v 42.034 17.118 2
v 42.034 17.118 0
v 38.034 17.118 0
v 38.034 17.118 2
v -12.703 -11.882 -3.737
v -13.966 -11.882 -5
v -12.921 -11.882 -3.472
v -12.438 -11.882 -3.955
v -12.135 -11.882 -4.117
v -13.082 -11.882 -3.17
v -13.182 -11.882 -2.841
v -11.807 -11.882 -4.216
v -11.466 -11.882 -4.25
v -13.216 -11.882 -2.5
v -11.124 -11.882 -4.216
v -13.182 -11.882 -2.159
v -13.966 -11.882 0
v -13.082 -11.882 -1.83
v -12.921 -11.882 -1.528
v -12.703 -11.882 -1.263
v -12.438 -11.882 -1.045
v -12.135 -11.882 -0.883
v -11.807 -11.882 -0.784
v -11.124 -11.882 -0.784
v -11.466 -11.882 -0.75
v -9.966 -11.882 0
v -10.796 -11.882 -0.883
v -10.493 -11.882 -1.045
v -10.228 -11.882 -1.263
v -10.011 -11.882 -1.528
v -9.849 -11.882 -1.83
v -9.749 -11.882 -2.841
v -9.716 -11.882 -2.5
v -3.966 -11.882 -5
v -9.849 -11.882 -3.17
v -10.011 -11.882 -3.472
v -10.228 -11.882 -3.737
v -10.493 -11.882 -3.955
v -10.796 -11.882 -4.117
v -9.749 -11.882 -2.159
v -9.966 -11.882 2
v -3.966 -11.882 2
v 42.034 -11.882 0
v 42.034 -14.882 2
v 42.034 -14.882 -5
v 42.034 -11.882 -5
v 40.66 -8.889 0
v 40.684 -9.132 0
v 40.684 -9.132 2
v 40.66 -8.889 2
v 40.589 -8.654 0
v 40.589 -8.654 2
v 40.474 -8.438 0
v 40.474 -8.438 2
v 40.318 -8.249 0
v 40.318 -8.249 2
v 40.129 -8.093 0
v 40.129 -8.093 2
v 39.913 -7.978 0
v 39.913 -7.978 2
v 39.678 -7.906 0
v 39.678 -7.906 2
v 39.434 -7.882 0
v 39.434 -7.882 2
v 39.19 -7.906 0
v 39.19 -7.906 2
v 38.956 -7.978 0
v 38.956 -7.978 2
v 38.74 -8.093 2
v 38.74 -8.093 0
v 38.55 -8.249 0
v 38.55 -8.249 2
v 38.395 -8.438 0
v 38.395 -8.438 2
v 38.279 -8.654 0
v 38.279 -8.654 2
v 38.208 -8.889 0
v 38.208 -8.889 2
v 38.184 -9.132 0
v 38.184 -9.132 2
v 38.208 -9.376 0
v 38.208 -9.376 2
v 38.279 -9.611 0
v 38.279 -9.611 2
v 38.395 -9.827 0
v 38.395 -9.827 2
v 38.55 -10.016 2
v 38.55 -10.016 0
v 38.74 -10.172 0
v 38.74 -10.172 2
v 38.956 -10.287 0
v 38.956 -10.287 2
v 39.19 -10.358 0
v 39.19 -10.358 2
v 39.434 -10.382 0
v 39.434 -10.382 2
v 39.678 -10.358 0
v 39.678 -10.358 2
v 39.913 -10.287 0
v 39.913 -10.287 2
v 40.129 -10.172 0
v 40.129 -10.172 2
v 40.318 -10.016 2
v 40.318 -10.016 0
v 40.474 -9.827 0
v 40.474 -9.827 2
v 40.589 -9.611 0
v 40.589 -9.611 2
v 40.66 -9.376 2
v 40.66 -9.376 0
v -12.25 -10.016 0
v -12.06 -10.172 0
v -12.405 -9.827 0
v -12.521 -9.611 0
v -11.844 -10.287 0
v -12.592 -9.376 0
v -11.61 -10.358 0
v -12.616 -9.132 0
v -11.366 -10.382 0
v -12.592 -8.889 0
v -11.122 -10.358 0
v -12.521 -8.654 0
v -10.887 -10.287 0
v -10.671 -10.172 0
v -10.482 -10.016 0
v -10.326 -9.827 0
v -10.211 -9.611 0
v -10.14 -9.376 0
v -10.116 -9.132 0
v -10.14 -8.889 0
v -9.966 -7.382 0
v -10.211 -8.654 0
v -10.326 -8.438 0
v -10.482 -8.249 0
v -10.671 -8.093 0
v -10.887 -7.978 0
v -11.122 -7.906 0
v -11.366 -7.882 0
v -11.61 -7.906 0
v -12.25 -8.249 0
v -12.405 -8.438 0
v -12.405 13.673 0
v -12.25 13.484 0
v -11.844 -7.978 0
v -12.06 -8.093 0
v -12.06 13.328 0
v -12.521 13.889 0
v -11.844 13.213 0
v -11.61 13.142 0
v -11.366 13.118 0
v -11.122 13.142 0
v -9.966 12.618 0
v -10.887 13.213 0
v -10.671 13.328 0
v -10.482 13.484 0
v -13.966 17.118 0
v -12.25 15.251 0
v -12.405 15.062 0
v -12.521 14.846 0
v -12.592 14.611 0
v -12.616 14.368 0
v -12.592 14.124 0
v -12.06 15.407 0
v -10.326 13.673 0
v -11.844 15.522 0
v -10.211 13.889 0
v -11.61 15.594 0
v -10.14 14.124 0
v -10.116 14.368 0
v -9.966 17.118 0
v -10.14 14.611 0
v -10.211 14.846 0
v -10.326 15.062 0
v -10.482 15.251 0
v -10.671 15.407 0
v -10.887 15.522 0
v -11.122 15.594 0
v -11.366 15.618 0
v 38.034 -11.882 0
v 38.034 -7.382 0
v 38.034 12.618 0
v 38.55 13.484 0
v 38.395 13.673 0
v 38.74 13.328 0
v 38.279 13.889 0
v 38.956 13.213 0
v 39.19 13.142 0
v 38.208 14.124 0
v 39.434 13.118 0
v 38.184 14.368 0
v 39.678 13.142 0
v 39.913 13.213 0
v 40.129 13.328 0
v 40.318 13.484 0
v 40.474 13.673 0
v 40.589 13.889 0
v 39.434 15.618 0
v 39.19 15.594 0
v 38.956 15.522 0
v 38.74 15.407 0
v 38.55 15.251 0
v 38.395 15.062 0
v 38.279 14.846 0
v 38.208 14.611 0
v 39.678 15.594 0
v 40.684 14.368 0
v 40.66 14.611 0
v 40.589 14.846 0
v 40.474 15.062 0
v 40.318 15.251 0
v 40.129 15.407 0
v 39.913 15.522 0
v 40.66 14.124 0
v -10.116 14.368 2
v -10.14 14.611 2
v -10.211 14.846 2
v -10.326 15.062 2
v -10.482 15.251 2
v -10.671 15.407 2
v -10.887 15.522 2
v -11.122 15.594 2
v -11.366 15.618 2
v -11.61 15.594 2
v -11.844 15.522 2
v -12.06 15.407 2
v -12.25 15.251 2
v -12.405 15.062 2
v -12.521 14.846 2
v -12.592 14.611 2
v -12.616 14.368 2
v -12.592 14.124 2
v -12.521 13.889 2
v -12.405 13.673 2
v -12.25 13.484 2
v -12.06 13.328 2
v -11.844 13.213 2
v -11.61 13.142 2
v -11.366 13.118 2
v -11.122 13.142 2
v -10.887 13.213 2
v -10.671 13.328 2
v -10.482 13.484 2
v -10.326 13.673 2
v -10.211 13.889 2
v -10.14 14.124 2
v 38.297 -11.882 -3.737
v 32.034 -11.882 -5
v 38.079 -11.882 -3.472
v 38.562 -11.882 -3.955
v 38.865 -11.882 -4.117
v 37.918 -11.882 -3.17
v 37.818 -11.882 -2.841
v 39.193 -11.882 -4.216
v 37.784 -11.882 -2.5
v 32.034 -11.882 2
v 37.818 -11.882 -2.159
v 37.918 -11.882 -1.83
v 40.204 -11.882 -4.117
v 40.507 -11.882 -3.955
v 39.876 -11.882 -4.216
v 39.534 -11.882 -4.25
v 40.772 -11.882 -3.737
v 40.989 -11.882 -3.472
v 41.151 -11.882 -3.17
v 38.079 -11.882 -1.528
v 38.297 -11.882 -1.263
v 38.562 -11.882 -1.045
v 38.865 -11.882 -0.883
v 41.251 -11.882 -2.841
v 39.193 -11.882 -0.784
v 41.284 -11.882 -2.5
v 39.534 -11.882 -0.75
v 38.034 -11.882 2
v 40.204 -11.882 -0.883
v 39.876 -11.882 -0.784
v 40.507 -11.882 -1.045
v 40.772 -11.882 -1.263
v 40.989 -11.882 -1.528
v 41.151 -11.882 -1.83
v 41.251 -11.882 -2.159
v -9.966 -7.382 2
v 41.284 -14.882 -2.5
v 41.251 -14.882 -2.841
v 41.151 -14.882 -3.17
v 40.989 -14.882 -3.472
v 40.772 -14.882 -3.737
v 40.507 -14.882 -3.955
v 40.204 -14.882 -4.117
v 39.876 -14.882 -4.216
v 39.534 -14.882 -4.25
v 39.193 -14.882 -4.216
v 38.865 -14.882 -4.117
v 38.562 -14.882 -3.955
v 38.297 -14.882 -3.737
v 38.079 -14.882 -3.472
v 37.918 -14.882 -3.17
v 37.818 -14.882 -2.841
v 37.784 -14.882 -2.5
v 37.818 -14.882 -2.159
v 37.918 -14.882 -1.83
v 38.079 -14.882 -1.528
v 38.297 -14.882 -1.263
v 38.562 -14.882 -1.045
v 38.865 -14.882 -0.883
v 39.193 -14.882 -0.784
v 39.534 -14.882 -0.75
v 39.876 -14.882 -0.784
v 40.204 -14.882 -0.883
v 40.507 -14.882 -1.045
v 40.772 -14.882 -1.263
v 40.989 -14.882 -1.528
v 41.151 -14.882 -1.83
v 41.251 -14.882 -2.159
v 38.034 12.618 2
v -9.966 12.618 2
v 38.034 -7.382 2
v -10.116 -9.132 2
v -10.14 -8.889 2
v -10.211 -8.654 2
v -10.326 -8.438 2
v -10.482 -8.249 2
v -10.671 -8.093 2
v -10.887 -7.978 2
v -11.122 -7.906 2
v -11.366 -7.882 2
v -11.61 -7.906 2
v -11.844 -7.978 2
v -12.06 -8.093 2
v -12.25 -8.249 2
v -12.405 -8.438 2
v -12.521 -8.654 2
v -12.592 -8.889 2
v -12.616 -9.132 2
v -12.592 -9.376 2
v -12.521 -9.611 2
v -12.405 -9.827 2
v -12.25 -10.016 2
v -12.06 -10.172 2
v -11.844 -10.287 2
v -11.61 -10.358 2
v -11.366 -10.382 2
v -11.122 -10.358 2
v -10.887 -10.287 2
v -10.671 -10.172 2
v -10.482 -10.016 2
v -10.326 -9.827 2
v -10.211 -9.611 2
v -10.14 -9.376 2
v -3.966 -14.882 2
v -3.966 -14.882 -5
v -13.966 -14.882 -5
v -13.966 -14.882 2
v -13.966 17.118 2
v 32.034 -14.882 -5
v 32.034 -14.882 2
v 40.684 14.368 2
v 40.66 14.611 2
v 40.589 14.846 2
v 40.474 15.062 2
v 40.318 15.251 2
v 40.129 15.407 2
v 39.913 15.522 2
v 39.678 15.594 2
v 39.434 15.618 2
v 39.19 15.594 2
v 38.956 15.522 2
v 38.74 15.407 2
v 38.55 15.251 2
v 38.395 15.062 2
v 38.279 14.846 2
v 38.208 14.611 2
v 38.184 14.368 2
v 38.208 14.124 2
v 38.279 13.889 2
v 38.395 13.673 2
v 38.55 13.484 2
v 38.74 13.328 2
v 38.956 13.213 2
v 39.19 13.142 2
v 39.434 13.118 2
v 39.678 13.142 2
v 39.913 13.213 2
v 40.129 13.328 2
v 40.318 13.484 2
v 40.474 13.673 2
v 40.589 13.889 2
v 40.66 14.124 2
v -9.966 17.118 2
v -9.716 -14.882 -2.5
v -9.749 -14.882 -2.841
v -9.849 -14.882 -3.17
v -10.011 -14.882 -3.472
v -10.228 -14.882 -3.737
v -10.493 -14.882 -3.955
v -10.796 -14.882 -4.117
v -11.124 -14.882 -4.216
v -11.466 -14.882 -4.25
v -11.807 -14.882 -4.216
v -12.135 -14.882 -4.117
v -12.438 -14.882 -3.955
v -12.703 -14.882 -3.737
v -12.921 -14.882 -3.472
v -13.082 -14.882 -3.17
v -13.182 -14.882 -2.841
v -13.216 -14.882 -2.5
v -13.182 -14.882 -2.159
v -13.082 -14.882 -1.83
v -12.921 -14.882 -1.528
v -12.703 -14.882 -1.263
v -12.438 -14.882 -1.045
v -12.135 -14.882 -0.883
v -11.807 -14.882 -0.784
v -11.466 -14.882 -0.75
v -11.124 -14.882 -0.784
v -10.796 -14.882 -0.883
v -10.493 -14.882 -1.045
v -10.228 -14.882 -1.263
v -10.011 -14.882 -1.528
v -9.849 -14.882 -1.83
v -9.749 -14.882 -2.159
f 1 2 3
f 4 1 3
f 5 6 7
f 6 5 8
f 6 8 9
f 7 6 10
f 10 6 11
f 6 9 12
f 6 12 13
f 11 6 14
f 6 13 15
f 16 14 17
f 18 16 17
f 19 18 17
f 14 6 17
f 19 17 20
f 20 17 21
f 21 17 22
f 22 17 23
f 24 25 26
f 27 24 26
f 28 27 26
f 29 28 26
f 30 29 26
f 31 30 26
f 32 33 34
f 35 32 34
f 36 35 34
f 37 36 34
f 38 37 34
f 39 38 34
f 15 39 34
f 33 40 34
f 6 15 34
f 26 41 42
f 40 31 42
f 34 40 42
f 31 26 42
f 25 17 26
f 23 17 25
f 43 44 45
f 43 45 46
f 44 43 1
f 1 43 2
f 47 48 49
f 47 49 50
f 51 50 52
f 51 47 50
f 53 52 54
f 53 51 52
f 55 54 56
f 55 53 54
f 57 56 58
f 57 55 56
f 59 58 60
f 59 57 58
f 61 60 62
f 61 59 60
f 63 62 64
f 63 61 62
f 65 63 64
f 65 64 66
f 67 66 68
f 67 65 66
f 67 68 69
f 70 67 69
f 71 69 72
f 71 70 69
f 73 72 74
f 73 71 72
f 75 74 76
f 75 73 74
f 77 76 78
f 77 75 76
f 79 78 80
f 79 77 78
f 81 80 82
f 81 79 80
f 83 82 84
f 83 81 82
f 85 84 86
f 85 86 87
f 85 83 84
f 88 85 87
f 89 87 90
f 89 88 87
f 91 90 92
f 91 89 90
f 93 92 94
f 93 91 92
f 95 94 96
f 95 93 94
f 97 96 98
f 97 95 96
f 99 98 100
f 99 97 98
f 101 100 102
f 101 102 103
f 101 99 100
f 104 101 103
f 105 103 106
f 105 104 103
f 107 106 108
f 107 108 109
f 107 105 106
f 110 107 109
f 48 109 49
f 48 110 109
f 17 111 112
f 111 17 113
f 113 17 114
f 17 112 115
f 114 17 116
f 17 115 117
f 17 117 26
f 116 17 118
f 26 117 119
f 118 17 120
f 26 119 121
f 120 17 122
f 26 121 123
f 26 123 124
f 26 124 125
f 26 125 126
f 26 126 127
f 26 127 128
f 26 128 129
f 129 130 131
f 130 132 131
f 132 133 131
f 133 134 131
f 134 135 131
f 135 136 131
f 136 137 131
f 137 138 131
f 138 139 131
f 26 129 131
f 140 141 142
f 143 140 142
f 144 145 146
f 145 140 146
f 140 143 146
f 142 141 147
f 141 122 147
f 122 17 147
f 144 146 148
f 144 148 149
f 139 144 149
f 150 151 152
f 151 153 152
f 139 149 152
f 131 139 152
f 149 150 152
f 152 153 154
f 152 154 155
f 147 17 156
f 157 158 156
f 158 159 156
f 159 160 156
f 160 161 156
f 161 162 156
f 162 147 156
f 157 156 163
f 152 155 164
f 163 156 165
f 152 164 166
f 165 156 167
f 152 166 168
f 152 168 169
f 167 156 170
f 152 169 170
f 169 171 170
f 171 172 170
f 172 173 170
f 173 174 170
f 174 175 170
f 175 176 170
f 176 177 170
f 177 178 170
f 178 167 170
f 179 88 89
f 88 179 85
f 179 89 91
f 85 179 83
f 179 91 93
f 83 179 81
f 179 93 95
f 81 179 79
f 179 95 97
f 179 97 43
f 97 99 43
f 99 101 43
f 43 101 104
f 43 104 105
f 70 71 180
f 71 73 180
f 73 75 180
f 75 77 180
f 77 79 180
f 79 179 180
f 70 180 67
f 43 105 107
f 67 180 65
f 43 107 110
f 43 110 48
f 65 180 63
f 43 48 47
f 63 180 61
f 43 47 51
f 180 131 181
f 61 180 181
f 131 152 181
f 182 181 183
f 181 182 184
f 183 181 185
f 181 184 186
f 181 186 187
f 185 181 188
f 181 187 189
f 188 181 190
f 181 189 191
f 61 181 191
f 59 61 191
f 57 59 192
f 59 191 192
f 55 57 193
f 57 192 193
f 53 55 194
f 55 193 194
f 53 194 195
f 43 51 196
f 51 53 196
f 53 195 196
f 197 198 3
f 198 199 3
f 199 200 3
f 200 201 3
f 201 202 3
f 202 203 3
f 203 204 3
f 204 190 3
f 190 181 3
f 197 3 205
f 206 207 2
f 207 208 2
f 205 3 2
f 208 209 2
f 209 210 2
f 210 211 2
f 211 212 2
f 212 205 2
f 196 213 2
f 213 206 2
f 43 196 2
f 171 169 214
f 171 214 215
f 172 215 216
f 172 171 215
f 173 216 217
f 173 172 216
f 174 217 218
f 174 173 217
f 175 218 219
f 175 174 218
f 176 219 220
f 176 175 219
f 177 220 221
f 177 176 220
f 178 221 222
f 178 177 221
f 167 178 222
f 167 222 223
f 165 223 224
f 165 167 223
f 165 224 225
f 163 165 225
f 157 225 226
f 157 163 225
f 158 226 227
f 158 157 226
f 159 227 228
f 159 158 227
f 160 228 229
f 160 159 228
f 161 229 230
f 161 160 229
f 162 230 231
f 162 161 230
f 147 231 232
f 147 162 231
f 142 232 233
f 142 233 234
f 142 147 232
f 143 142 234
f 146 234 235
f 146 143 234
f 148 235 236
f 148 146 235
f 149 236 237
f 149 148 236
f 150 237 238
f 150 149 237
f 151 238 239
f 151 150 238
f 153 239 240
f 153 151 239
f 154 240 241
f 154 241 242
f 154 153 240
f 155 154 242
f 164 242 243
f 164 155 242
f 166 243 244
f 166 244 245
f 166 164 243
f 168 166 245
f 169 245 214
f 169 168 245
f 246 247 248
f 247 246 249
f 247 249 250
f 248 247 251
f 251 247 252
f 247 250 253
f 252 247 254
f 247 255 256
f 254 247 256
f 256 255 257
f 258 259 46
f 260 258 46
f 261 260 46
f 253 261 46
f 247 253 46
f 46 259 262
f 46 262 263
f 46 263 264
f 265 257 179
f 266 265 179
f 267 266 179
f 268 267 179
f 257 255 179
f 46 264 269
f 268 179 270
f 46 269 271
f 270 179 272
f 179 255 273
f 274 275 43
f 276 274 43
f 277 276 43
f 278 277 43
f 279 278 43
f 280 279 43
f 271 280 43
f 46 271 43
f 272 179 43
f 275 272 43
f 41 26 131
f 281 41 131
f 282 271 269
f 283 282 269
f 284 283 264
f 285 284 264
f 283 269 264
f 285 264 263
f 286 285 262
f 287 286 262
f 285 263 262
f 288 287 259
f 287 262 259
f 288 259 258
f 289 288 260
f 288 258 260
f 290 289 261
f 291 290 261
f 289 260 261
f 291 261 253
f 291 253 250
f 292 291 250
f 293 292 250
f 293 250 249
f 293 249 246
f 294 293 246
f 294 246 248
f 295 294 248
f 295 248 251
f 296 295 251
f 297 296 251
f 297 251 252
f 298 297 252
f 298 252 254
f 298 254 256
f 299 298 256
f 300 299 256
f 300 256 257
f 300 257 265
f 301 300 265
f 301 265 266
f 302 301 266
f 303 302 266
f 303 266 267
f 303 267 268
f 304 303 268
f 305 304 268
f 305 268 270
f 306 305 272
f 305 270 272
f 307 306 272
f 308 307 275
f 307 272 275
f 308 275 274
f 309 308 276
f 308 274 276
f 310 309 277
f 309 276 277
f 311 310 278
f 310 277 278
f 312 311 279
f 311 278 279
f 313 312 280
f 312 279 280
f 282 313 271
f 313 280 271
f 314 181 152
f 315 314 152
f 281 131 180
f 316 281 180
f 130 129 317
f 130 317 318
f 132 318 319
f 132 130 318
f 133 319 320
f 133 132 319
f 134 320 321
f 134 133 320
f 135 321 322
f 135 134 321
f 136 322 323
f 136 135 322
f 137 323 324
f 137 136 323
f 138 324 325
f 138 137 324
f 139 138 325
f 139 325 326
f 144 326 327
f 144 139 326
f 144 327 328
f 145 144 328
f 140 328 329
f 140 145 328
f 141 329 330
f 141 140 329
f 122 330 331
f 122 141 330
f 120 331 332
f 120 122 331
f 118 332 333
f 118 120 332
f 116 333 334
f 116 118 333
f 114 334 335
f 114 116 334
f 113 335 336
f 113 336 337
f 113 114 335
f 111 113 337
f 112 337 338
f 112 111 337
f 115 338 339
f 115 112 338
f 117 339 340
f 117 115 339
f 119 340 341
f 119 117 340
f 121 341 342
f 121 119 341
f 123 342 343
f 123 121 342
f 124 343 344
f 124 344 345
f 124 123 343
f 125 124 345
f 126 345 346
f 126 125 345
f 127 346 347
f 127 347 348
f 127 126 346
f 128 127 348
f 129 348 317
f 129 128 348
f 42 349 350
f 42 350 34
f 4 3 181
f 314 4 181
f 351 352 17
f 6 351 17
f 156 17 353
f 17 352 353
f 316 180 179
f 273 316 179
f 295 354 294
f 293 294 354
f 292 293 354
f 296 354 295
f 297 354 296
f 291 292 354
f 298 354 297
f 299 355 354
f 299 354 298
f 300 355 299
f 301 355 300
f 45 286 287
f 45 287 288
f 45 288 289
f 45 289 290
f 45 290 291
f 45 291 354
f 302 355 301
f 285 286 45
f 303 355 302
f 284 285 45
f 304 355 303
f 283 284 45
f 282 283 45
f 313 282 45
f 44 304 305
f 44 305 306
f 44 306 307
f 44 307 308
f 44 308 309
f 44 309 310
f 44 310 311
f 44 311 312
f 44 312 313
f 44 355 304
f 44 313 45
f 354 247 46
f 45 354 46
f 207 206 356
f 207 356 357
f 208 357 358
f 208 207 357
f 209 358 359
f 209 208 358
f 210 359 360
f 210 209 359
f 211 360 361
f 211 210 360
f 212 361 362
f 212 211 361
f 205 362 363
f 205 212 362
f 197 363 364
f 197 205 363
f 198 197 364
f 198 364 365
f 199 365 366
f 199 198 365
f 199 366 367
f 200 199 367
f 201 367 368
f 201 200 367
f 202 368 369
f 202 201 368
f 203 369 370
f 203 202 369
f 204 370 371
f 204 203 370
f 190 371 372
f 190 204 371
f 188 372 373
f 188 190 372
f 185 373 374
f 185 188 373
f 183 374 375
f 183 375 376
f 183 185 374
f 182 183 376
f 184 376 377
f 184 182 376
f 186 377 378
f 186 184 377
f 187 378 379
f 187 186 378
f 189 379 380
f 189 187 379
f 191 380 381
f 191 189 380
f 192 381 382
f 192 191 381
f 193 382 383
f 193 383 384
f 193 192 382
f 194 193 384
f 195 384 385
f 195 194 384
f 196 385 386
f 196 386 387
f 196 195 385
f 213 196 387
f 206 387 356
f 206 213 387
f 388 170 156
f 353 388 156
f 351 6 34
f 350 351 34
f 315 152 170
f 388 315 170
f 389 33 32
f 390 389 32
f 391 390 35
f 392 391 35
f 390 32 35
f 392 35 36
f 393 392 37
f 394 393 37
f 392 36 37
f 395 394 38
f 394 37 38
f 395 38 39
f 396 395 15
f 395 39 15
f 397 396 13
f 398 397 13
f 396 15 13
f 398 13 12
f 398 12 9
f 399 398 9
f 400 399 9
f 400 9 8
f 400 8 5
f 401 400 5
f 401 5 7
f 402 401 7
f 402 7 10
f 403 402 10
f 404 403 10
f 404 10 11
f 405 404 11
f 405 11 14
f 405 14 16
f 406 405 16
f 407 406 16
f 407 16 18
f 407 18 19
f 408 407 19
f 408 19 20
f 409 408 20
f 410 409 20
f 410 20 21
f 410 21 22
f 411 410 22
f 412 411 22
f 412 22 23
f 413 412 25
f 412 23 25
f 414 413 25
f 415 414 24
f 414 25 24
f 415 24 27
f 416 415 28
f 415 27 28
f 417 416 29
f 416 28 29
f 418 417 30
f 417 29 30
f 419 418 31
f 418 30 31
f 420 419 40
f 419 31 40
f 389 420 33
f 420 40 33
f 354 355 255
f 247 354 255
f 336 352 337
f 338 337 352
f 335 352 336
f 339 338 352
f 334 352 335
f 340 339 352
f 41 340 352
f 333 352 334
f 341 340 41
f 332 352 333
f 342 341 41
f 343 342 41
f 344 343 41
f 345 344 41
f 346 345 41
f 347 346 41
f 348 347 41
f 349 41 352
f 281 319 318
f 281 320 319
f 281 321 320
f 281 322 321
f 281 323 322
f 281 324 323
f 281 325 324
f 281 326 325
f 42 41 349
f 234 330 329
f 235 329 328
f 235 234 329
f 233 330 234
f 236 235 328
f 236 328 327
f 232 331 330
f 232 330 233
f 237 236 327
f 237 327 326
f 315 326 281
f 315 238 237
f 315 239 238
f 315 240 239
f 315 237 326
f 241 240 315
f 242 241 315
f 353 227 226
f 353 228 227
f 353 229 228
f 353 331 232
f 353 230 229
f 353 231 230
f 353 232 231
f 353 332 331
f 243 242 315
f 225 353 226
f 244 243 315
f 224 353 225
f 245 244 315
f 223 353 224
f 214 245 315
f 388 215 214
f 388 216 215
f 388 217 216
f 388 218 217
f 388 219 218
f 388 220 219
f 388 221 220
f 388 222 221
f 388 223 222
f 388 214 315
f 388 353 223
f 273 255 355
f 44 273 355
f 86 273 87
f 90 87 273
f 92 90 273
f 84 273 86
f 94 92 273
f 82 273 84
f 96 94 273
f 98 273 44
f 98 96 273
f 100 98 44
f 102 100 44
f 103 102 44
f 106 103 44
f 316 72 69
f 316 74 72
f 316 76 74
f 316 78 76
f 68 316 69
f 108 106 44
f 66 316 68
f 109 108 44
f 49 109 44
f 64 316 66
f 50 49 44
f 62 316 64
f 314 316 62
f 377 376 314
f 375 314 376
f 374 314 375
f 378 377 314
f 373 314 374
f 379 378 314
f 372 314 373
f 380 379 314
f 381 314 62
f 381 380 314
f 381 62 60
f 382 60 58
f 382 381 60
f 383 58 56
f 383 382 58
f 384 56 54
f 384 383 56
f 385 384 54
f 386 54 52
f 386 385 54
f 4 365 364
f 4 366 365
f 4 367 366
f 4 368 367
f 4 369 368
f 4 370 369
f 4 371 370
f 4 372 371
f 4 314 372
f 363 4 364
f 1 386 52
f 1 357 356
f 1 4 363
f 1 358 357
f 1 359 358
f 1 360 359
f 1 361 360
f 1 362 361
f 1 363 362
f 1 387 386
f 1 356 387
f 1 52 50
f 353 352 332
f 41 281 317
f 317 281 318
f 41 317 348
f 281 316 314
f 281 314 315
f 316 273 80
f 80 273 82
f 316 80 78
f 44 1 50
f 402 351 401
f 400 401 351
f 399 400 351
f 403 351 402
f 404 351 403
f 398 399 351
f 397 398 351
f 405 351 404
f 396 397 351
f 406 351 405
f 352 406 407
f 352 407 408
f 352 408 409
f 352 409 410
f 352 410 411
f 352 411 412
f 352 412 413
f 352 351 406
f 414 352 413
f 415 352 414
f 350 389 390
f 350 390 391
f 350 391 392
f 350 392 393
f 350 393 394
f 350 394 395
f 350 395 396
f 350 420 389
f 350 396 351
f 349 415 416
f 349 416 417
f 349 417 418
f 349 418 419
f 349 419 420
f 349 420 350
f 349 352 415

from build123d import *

# Parameters (mm, degrees)
ESBO_O1_R                = 1.25
RESSALTO_EXTRUS_O1_DEPTH = 2
ESBO_O3_W                = 10
ESBO_O3_H                = 3
RESSALTO_EXTRUS_O2_DEPTH = 7
ESBO_O4_R                = 1.75
CORTE_EXTRUS_O1_DEPTH    = 5


with BuildPart() as part:
    # Esboço1 → Ressalto-extrusão1 (new body)
    with BuildSketch(Plane.XY):
        Polygon((-9.965681545, 17.117604611), (-13.965681545, 17.117604611), (-13.965681545, -11.882395389), (-9.965681545, -11.882395389), (-9.965681545, -7.382395389), (38.034318455, -7.382395389), (38.034318455, -11.882395389), (42.034318455, -11.882395389), (42.034318455, 17.117604611), (38.034318455, 17.117604611), (38.034318455, 12.617604611), (-9.965681545, 12.617604611), align=None)
        with Locations((-11.365681545, -9.132395389)):
            Circle(ESBO_O1_R, mode=Mode.SUBTRACT)
        with Locations((39.434318455, -9.132395389)):
            Circle(ESBO_O1_R, mode=Mode.SUBTRACT)
        with Locations((-11.365681545, 14.367604611)):
            Circle(ESBO_O1_R, mode=Mode.SUBTRACT)
        with Locations((39.434318455, 14.367604611)):
            Circle(ESBO_O1_R, mode=Mode.SUBTRACT)
    extrude(amount=RESSALTO_EXTRUS_O1_DEPTH)

    # Esboço3 → Ressalto-extrusão2 (add)
    with BuildSketch(Plane.XY.offset(2)):
        with Locations((-8.965681545, -13.382395389)):
            Rectangle(ESBO_O3_W, ESBO_O3_H)
        with Locations((37.034318455, -13.382395389)):
            Rectangle(ESBO_O3_W, ESBO_O3_H)
    extrude(amount=-RESSALTO_EXTRUS_O2_DEPTH)

    # Esboço4 → Corte-extrusão1 (cut)
    with BuildSketch(Plane(origin=(0, -11.882395389, 0), x_dir=(1, 0, 0), z_dir=(0, 1, 0))):
        with Locations((-11.465681545, 2.5)):
            Circle(ESBO_O4_R)
        with Locations((39.534318455, 2.5)):
            Circle(ESBO_O4_R)
    extrude(amount=-CORTE_EXTRUS_O1_DEPTH, mode=Mode.SUBTRACT)


solid = part.part
